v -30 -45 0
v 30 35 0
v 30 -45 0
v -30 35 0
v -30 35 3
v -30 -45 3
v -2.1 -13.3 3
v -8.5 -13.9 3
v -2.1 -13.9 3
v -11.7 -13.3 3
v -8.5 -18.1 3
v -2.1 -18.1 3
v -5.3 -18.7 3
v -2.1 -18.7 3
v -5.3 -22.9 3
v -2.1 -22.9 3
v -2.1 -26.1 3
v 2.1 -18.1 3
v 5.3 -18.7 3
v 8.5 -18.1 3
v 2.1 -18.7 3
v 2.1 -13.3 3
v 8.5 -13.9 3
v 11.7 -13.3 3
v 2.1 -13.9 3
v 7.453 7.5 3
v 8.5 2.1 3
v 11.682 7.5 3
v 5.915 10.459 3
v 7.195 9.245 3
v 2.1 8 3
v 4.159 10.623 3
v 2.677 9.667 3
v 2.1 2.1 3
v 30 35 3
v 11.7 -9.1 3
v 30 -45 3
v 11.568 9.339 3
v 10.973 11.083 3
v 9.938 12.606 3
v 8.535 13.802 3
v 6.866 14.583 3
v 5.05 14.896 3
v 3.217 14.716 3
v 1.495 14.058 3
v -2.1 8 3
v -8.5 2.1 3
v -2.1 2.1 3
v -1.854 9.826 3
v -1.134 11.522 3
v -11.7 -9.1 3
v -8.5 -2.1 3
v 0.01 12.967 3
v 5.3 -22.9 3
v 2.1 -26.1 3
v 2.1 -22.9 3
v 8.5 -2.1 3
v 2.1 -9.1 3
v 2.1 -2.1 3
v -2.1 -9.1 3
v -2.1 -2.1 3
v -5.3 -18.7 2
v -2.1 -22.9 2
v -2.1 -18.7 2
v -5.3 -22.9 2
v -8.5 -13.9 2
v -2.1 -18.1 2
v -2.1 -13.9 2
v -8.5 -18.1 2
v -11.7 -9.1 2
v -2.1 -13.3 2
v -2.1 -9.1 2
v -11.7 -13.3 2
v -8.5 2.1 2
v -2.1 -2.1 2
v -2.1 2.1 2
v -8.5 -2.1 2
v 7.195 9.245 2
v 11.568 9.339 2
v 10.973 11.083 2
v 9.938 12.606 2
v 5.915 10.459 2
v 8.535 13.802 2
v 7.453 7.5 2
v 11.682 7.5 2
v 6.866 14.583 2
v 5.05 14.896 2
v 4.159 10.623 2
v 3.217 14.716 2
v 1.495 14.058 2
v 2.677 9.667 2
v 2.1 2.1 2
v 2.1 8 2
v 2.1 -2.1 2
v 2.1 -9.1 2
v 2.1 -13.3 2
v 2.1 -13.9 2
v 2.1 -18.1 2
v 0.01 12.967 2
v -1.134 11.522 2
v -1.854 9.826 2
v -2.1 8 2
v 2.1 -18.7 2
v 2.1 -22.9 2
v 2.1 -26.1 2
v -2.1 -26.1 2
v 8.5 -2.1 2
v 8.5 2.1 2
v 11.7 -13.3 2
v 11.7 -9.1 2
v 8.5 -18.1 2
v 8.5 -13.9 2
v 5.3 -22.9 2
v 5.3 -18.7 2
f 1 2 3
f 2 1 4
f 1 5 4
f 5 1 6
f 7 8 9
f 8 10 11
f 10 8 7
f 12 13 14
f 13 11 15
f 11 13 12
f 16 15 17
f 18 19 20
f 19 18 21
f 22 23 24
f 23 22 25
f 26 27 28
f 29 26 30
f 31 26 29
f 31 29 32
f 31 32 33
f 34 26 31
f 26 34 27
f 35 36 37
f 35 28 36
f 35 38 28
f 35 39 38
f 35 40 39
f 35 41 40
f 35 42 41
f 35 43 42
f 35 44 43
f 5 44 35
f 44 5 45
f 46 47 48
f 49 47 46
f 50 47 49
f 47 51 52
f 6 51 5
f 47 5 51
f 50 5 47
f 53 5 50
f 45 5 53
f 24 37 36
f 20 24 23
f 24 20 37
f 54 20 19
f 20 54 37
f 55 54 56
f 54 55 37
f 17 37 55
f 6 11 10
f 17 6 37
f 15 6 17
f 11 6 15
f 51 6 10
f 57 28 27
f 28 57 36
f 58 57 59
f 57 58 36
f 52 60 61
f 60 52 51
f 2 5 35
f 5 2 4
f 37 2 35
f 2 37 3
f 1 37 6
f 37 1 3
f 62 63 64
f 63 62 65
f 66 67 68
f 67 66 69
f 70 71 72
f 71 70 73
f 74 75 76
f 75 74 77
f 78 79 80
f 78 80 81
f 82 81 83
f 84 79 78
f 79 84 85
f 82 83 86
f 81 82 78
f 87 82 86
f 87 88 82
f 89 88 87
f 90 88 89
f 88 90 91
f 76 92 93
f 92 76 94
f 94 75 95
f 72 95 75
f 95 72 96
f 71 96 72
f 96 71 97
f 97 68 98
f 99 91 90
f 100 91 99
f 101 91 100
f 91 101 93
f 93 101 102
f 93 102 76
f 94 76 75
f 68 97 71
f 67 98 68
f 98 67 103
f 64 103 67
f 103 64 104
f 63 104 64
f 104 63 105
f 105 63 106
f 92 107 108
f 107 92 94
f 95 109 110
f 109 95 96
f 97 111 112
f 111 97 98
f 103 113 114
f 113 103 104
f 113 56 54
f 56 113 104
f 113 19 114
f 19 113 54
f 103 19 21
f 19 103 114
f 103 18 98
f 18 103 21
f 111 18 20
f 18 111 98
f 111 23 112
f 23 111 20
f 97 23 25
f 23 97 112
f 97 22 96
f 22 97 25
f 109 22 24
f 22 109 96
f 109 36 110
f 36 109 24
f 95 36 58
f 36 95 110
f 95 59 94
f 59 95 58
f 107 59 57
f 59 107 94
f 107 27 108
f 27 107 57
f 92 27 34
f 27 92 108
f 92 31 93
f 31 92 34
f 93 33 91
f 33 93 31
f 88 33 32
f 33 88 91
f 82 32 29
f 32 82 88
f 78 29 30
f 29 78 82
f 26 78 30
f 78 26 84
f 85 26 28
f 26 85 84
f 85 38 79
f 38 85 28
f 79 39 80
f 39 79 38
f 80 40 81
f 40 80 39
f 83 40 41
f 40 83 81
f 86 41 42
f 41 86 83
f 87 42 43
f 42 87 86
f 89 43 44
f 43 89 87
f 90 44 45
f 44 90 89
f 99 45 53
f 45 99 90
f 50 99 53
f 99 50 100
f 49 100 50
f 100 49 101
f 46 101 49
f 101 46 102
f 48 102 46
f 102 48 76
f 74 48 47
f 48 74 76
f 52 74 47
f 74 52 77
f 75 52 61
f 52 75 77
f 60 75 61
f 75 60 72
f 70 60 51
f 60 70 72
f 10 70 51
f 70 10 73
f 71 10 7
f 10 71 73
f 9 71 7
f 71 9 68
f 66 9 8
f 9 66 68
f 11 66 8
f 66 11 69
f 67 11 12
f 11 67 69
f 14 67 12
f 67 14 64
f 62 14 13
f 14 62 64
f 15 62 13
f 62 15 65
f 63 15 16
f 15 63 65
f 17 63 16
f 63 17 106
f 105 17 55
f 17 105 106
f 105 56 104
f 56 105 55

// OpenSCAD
difference() {
translate([-30,-45,0]) linear_extrude(height=3) square([60,80]);
translate([0,0,2]) linear_extrude(file="FoulabFexpand05.dxf",height=1.1);
}
